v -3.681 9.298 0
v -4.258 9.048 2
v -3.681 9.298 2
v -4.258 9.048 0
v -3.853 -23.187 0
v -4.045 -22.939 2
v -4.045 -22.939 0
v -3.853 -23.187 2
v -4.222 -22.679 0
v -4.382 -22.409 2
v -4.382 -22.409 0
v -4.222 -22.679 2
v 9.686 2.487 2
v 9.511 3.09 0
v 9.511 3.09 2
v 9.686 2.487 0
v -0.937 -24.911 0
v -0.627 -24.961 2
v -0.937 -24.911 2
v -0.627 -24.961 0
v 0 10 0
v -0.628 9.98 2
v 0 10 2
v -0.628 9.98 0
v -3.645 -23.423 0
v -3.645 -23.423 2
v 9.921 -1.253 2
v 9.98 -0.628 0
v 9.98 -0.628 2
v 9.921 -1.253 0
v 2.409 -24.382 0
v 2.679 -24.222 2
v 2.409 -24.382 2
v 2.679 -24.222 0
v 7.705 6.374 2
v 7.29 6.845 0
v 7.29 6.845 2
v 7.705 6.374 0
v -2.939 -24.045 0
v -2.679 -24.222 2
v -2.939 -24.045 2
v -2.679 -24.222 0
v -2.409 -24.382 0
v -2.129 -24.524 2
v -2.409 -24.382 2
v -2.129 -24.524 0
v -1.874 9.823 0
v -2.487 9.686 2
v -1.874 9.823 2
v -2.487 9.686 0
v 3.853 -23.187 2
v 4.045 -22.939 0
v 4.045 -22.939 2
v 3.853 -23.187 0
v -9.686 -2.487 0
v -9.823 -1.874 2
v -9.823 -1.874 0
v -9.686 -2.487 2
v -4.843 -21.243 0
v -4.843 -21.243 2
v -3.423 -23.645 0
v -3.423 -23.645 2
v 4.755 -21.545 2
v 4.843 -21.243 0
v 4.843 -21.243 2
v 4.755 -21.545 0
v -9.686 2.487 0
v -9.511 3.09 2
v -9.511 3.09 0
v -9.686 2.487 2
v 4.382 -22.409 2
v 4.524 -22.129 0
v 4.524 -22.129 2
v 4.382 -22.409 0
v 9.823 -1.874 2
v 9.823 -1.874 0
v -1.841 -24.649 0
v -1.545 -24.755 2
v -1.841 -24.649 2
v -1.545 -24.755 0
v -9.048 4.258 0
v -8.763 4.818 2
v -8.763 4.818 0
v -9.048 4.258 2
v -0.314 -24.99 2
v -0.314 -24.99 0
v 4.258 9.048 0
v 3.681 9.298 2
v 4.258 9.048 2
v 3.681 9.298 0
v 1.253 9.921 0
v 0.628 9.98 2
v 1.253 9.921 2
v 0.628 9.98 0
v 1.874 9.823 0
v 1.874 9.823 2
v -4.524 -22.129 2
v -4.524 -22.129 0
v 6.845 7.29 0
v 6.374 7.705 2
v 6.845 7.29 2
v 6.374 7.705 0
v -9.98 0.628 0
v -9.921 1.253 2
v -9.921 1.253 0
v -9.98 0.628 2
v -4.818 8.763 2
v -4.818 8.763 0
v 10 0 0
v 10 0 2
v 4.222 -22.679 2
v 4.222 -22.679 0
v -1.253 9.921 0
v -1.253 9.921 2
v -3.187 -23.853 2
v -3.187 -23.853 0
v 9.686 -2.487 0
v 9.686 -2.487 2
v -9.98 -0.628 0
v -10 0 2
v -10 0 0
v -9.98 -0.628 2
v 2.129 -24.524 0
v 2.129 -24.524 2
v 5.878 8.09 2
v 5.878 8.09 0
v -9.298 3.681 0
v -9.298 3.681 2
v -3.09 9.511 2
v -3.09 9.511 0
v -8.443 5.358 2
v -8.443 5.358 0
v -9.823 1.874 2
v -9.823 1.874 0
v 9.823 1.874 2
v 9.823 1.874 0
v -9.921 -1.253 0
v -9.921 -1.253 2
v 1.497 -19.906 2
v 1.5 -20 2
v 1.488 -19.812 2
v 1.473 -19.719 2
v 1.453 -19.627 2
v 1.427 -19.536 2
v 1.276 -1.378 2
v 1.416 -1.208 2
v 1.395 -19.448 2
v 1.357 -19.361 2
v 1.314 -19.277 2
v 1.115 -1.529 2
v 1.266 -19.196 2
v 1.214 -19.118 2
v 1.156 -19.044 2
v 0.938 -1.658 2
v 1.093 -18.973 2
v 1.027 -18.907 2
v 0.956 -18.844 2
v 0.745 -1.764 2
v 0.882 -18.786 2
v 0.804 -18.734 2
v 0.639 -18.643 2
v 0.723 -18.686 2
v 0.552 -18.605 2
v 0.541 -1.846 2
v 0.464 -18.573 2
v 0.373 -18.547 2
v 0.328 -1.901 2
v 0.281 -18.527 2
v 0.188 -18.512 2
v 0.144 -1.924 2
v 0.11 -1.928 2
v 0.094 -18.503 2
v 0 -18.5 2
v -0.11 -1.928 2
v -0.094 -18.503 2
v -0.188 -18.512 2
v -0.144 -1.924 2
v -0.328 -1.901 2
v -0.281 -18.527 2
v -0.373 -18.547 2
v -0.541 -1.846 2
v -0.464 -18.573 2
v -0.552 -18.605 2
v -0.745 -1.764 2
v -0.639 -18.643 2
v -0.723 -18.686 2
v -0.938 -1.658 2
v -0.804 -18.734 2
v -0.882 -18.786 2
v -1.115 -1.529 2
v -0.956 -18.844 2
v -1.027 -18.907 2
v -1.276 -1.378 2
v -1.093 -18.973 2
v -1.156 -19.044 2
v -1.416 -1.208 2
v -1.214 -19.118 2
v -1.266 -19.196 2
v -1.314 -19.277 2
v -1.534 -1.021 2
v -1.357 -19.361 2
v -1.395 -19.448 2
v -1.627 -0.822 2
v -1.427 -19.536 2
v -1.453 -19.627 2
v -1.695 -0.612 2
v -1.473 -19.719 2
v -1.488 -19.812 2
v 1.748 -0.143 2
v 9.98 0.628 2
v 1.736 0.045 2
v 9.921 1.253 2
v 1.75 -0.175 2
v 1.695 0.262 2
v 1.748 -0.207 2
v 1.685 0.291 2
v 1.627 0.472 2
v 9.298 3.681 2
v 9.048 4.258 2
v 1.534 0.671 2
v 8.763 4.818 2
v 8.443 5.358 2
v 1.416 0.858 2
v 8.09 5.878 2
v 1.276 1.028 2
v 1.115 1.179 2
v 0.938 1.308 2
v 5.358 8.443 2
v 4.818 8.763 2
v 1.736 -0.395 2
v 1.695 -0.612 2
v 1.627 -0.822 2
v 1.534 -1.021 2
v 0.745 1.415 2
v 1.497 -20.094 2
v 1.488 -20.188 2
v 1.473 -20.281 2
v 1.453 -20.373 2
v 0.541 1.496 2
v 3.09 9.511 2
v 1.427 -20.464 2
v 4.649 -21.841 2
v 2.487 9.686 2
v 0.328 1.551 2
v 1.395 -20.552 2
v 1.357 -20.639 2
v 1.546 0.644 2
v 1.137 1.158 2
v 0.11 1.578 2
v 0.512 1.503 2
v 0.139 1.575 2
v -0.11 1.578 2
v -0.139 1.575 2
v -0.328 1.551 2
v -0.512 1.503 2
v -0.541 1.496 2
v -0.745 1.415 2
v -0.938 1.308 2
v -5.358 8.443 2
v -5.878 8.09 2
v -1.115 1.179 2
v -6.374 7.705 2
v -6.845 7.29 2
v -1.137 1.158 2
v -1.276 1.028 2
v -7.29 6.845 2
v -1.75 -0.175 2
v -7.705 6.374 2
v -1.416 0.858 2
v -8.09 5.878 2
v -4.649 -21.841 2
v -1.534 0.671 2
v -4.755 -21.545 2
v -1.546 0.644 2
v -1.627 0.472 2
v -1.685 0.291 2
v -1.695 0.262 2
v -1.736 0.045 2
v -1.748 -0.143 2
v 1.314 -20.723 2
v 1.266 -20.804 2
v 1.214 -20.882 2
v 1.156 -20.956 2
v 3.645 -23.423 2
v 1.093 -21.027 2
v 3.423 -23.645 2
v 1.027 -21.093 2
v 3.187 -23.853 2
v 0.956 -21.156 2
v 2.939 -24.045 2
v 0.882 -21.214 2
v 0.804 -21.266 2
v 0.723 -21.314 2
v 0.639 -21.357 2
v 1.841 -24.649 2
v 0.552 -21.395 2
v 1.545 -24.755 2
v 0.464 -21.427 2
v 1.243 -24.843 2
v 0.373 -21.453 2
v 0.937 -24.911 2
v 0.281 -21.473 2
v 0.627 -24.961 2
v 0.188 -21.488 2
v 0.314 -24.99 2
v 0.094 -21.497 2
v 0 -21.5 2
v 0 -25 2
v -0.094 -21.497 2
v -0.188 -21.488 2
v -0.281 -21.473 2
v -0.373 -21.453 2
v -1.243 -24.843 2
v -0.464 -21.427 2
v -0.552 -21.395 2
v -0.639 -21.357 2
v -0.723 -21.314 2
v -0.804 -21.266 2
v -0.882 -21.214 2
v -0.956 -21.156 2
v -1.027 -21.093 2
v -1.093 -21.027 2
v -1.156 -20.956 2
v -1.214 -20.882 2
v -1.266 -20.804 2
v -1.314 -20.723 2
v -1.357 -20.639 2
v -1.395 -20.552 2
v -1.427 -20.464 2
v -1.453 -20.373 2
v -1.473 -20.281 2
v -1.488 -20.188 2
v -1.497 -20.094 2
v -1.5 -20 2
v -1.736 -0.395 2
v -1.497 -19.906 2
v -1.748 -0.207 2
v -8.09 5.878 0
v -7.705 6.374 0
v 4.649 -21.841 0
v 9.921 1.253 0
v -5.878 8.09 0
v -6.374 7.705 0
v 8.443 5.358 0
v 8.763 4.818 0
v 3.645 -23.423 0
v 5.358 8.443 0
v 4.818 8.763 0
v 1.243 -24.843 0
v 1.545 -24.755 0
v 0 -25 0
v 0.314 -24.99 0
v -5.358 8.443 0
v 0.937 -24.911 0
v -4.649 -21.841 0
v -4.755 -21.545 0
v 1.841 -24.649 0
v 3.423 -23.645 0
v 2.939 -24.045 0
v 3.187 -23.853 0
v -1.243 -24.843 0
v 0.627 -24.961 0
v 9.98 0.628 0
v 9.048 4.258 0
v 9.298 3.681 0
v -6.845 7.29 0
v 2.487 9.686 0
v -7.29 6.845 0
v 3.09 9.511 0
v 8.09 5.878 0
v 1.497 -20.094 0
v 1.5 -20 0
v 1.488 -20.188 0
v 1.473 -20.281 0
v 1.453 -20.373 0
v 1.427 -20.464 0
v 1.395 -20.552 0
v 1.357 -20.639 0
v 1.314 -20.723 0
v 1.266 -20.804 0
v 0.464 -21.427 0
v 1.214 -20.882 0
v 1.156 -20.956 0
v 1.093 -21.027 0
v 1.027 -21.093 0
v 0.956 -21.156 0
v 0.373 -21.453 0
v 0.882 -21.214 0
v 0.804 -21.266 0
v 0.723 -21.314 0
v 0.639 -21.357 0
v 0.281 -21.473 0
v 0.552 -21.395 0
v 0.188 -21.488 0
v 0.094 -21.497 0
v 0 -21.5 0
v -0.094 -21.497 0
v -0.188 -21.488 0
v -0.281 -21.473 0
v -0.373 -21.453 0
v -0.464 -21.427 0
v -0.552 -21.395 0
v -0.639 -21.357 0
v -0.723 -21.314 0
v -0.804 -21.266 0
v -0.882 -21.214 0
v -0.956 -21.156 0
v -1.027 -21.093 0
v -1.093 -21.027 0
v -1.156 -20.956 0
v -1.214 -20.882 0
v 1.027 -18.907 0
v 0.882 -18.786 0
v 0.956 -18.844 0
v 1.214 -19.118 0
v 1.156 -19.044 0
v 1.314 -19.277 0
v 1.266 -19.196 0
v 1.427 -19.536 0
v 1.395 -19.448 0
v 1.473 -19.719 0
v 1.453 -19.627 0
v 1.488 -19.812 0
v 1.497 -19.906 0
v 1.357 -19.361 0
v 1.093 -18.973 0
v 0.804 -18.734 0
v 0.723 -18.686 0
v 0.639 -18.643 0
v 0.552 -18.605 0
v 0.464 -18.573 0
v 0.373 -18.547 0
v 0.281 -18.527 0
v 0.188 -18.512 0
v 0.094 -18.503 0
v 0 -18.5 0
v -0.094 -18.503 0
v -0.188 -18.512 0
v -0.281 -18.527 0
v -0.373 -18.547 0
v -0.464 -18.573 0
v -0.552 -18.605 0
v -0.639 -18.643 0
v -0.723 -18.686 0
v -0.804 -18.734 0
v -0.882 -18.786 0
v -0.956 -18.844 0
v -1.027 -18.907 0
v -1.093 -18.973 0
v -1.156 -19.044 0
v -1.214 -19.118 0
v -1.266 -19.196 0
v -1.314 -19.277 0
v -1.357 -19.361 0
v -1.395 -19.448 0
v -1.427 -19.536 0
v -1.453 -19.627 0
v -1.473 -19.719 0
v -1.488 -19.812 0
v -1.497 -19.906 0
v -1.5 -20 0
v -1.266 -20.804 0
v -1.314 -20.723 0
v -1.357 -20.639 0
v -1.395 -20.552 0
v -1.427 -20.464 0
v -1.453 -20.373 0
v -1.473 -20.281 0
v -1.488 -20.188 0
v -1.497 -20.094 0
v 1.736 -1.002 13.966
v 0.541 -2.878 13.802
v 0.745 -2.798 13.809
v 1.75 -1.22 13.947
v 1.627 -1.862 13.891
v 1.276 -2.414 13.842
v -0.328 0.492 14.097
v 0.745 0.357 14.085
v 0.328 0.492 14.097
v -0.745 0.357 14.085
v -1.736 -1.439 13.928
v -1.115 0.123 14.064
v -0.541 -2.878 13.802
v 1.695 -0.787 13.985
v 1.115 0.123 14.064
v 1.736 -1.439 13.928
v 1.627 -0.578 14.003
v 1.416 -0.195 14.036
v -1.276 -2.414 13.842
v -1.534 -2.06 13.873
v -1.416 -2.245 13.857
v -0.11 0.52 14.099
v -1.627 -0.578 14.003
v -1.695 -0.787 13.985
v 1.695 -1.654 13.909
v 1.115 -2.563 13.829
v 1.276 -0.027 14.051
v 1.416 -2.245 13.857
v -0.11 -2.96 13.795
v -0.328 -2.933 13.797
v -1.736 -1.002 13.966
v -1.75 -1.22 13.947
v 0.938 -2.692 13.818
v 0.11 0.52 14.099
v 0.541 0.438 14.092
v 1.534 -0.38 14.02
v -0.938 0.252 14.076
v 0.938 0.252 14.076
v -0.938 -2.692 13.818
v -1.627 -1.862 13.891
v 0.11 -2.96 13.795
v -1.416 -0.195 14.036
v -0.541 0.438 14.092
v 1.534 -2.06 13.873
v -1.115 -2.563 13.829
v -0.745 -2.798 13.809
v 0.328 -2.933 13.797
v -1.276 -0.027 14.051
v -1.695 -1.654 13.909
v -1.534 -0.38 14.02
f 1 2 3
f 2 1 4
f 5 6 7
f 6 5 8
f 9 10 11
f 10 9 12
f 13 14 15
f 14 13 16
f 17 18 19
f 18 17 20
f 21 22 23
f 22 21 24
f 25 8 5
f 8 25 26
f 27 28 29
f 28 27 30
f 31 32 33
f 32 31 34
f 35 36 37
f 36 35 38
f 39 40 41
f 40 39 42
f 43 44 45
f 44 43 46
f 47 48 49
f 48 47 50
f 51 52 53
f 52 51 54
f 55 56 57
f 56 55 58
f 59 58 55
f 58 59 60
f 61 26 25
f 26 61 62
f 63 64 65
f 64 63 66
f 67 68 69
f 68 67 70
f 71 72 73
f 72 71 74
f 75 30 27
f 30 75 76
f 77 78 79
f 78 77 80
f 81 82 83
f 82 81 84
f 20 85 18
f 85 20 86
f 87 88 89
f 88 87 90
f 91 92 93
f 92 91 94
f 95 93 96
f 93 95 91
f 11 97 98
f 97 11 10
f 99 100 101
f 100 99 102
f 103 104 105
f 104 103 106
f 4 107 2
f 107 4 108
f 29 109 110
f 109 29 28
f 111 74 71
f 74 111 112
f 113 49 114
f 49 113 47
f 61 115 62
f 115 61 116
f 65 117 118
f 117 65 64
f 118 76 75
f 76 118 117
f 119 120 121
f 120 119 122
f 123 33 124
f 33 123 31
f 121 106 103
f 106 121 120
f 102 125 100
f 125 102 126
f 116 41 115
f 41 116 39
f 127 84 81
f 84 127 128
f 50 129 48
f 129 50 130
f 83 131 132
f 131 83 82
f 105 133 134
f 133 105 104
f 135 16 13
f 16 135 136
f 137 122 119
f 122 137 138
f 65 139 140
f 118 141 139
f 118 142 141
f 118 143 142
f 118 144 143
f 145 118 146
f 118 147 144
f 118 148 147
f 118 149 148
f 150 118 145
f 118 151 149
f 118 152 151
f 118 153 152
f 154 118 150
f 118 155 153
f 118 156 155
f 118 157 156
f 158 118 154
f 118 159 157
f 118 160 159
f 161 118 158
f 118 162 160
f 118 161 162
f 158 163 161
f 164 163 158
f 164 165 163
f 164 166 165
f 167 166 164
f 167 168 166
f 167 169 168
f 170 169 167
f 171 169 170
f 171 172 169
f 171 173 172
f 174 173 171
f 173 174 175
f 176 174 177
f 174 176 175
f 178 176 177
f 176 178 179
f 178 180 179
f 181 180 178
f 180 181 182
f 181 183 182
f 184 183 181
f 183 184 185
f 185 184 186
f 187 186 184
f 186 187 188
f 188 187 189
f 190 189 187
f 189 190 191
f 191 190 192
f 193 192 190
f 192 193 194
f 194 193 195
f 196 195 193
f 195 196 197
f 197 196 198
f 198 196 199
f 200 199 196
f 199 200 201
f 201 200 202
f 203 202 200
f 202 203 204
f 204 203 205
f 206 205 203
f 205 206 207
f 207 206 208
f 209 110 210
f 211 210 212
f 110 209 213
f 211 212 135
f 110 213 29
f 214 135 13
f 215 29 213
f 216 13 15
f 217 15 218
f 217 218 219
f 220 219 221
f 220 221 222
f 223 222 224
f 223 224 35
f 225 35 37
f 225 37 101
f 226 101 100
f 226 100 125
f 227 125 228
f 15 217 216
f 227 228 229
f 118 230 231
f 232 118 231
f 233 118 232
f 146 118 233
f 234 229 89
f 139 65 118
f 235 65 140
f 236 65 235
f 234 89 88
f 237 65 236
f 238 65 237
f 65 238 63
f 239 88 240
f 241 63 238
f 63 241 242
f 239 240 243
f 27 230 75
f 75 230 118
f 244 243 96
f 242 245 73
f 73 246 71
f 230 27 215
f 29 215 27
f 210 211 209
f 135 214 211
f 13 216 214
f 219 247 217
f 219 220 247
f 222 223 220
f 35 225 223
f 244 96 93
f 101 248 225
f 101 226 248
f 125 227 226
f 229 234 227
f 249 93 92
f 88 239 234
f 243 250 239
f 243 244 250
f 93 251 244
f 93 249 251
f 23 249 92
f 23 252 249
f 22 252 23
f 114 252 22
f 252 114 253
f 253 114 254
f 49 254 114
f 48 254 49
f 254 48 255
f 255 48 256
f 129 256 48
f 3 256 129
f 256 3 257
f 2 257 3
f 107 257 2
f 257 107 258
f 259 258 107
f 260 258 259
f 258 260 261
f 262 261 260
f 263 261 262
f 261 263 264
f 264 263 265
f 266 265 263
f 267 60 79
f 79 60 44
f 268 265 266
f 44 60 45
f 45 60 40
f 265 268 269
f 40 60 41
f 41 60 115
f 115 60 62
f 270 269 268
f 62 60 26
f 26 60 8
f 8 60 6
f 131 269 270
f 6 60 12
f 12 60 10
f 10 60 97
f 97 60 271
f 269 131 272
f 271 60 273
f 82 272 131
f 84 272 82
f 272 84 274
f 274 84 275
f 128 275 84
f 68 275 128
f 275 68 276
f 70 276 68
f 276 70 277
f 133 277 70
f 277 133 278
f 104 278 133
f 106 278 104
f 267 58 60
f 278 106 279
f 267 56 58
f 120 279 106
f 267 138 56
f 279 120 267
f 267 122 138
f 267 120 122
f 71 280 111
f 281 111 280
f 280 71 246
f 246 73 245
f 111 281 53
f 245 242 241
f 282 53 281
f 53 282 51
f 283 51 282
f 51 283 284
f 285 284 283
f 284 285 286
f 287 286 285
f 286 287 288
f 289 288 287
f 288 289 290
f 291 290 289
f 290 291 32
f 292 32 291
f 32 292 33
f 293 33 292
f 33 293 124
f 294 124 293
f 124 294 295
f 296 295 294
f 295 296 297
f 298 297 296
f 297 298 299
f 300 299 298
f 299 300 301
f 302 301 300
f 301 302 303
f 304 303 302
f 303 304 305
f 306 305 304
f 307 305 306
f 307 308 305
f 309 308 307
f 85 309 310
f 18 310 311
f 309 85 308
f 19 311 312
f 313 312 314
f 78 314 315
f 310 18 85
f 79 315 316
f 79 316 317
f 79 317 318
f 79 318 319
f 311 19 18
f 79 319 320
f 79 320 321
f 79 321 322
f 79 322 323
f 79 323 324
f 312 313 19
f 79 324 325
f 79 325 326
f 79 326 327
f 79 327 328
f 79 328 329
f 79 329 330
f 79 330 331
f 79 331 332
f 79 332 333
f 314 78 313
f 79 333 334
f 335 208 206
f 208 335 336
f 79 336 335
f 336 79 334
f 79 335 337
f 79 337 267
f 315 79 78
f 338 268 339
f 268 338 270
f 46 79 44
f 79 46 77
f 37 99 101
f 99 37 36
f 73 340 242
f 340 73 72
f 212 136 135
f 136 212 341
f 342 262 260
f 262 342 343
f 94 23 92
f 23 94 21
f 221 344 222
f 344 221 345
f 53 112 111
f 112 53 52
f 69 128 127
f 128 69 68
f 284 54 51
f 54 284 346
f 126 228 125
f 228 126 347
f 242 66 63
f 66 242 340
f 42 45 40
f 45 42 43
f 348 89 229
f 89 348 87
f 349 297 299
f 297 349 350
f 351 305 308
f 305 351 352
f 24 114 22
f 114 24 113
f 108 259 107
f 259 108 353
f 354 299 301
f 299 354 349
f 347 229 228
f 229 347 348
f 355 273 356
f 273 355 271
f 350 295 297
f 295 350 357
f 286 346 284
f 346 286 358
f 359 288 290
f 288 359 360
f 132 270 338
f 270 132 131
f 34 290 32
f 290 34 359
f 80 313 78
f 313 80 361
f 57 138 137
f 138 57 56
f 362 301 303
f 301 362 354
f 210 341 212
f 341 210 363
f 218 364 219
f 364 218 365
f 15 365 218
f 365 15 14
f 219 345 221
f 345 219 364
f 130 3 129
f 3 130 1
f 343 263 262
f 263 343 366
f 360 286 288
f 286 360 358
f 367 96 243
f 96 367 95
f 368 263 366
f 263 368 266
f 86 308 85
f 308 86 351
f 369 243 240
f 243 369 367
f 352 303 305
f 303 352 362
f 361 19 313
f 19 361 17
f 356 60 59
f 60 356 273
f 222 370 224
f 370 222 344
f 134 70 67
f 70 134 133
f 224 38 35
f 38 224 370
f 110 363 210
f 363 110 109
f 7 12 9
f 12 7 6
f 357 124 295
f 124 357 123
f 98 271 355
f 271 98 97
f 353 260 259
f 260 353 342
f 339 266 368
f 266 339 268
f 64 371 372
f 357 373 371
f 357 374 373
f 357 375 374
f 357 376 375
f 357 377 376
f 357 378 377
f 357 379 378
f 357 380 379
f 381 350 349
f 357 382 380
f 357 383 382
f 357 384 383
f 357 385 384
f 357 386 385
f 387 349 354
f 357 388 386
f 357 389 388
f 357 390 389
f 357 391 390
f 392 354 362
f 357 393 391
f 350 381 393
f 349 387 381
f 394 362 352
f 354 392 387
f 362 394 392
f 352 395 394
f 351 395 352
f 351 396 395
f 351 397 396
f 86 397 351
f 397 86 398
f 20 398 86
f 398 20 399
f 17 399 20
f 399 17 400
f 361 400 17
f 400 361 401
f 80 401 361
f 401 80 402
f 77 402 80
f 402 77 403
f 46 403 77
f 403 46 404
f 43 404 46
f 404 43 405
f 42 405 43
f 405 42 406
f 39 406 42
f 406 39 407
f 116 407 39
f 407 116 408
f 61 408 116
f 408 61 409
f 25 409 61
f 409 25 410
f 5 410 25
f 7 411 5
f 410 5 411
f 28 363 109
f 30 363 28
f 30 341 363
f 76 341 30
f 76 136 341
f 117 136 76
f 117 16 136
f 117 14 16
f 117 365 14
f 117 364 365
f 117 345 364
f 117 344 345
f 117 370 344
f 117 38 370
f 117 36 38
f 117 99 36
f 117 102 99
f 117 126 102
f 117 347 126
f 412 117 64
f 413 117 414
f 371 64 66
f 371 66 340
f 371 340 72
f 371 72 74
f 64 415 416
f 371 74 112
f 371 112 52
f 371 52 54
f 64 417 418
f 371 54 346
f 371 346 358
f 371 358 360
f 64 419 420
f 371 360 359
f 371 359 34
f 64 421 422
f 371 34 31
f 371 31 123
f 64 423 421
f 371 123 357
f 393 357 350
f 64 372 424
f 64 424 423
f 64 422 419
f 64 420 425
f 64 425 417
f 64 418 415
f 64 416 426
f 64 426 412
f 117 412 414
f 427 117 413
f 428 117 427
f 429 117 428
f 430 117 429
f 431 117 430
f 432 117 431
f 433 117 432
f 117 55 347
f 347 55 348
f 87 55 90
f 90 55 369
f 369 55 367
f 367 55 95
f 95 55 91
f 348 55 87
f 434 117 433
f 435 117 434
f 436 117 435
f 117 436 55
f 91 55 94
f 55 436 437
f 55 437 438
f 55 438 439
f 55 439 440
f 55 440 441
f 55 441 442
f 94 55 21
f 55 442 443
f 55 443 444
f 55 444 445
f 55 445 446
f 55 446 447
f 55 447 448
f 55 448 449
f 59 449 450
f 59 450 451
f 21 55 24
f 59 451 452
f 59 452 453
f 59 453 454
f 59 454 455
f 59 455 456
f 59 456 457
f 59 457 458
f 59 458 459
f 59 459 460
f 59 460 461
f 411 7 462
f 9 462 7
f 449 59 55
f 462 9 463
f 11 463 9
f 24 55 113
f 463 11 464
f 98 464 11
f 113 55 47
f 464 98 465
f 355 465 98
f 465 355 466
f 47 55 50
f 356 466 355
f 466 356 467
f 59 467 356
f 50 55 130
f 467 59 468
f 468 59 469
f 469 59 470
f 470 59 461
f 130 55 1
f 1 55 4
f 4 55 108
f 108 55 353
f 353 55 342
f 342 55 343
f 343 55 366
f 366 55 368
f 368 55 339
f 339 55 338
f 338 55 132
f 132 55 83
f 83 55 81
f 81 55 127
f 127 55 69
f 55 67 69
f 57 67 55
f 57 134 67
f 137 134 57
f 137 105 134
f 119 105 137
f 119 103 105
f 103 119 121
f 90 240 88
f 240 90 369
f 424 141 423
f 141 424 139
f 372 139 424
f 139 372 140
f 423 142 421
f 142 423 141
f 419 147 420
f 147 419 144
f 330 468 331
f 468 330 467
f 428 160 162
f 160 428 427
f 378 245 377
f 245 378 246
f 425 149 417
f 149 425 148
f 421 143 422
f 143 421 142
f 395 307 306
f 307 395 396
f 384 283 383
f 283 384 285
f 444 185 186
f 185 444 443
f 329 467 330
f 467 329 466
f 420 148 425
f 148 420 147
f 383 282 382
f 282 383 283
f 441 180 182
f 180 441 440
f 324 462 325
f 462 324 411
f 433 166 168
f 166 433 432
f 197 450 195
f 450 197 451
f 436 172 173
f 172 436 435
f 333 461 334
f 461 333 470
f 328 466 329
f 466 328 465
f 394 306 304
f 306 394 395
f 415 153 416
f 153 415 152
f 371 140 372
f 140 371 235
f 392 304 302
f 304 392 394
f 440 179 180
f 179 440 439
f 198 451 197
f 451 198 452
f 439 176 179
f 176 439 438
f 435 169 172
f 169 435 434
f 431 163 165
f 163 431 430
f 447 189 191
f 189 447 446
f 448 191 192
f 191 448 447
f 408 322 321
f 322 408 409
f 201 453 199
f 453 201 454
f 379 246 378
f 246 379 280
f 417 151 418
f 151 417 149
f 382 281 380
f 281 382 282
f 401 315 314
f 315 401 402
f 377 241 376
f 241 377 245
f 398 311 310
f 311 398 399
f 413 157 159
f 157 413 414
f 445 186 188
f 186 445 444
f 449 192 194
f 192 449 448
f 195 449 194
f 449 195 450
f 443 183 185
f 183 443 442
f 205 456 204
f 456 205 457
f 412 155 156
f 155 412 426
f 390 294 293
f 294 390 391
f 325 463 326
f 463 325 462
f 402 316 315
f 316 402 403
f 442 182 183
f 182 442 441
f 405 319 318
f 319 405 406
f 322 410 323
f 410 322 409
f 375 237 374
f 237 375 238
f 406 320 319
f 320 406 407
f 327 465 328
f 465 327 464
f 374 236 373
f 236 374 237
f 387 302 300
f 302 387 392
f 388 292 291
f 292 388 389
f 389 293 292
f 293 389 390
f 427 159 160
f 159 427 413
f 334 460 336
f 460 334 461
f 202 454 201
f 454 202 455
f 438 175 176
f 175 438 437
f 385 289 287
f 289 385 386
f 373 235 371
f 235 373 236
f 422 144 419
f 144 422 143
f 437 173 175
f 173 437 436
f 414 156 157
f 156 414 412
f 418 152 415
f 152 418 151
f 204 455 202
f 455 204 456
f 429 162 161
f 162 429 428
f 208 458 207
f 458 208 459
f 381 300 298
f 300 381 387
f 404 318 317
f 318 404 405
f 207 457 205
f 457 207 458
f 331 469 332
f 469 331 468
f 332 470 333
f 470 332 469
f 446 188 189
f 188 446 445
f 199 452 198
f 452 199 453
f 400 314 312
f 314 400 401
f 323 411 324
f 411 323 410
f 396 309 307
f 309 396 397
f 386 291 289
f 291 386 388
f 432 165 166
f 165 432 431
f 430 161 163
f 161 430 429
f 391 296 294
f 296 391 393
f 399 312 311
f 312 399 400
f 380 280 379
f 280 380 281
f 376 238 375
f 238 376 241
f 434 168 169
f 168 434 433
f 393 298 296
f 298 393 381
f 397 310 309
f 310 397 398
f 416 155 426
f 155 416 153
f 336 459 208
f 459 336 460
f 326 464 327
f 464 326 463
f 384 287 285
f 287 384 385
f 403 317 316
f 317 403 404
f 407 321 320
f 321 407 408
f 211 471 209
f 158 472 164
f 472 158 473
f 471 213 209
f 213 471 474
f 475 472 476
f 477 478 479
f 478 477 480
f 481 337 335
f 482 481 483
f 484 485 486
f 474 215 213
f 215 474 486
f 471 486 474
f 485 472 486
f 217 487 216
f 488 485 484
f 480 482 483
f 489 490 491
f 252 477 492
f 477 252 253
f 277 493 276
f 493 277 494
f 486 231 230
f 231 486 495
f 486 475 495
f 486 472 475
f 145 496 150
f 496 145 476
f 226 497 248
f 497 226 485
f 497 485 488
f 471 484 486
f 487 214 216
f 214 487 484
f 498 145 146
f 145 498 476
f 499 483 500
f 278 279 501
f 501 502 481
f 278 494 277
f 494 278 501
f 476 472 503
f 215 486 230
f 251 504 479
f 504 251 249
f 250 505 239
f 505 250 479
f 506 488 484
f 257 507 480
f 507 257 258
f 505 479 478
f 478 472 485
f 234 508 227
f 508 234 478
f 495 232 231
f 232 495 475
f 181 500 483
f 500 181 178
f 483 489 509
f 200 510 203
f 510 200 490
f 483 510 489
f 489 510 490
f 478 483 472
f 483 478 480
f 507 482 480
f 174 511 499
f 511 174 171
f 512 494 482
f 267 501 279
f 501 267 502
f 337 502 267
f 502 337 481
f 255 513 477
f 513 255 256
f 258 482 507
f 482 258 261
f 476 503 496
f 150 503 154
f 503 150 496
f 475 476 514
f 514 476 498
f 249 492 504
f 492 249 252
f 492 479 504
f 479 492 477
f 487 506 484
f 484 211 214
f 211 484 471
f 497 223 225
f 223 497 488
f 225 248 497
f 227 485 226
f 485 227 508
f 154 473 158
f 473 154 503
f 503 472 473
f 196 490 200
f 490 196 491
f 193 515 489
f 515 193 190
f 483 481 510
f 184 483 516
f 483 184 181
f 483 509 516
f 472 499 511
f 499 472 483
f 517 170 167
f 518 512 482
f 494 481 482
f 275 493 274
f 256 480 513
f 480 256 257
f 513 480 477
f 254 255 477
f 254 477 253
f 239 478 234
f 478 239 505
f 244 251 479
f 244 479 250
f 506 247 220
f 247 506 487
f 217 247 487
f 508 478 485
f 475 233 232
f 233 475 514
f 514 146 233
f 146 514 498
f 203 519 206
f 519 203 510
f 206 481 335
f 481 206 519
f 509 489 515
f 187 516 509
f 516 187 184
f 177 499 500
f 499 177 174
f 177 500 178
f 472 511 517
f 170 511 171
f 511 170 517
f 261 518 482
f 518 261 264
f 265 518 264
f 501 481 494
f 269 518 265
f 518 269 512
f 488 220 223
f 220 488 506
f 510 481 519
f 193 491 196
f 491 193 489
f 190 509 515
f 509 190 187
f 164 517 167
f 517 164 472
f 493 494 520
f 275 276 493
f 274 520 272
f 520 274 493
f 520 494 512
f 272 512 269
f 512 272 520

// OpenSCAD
// bottom
difference()
{
  h = 2;
  hull()
  {
    cylinder(d=20, h=h, $fn=100);
    translate([0, -20, 0])
      cylinder(d=10, h=h, $fn=100);
  }
  // hole
  translate([0, -20, -1])
    cylinder(d=3, h=h+2, $fn=100);
}

// hook
intersection()
{
  rotate([5, 0, 0])
    cylinder(d=3.5, h=14, $fn=50);
  cylinder(d=15, h=30, $fn=5);
}
